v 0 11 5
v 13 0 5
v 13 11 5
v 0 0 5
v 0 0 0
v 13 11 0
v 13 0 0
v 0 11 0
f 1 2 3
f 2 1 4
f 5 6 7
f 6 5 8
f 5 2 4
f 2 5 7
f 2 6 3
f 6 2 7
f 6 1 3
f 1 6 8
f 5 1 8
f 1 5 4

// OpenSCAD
// Generated by SolidPython 1.0.1 on 2020-07-29 00:46:55


cube(size = [13, 11, 5]);
/***********************************************
*********      SolidPython code:      **********
************************************************
 
# import packages: SolidPython
from solid import *
from solid.utils import *
from itertools import chain, combinations, permutations


class Resize:

    def __init__(self, scad_file):
        self.scad_file = scad_file
        #self.scad_file = import_scad(scad_file)
        # cone/cylinder param:
        self.r1 = 0
        self.r2 = 0
        self.h = 0
        # rectangular prism param:
        self.w = 0
        self.l = 0
        # ellipse param:
        self.r = 0

    # import OpenScad code (file name corresponds to shape)


    # classify shape + parameters
    def assign(self, param1, param2, param3):
        if self.scad_file == 'cone.scad':
            self.r1 = param1
            self.r2 = param2
            self.h = param3
        elif self.scad_file == 'cylinder.scad':
            self.r1 = param1
            self.r2 = param2
            self.h = param3
        elif self.scad_file == 'rectangularPrism.scad':
            self.h = param1
            self.l = param2
            self.w = param3
        else:
            self.r = param1
            self.h = param2

    # resize parameters
    def iterate(self):
        x = range(3, 20, 2)
        i = 1
        if self.scad_file == 'cone.scad':
            tempList = list(permutations(x, 2))
            for temp in tempList:
                param1 = temp[0]
                param2 = temp[1]
                filepath = 'produced_scad_files/' + 'cone' + str(param1) + '_' + str(param2) + '_' + '.scad'
                scad_render_to_file(cylinder(h=param1, r1=param2, r2=0), filepath)

        elif self.scad_file == 'cylinder.scad':
            tempList = list(permutations(x, 3))
            for temp in tempList:
                param1 = temp[0]
                param2 = temp[1]
                filepath = 'produced_scad_files/' + 'cylinder' + str(param1) + '_' + str(param2) + '_' + '.scad'
                scad_render_to_file(cylinder(h=param1, r1=param2, r2=param2), filepath)

        elif self.scad_file == 'rectangularPrism.scad':
            tempList = list(permutations(x, 3))
            for temp in tempList:
                param1 = temp[0]
                param2 = temp[1]
                param3 = temp[2]
                filepath = 'produced_scad_files/' + 'rectangularPrism' + str(param1) + '_' + str(param2) + '_' + str(
                    param3) + '.scad'
                scad_render_to_file(cube(size=(param1, param2, param3)), filepath)

        elif self.scad_file == 'ellipse.scad':
            tempList = list(permutations(x, 4))
            for temp in tempList:
                param1 = temp[0]
                param2 = temp[1]
                param3 = temp[2]
                param4 = temp[3]
                filepath = 'produced_scad_files/' + 'ellipse' + str(param1) + '_' + str(param2) + '_' + str(param3) + '_' + str(param4) + '.scad'
                scad_render_to_file(scale([param1, param2, param3])(sphere(r=param4)), filepath)

    def render_to_scadfile(self):
        scad_render_to_file(scad, 'example.scad') 
 
************************************************/
